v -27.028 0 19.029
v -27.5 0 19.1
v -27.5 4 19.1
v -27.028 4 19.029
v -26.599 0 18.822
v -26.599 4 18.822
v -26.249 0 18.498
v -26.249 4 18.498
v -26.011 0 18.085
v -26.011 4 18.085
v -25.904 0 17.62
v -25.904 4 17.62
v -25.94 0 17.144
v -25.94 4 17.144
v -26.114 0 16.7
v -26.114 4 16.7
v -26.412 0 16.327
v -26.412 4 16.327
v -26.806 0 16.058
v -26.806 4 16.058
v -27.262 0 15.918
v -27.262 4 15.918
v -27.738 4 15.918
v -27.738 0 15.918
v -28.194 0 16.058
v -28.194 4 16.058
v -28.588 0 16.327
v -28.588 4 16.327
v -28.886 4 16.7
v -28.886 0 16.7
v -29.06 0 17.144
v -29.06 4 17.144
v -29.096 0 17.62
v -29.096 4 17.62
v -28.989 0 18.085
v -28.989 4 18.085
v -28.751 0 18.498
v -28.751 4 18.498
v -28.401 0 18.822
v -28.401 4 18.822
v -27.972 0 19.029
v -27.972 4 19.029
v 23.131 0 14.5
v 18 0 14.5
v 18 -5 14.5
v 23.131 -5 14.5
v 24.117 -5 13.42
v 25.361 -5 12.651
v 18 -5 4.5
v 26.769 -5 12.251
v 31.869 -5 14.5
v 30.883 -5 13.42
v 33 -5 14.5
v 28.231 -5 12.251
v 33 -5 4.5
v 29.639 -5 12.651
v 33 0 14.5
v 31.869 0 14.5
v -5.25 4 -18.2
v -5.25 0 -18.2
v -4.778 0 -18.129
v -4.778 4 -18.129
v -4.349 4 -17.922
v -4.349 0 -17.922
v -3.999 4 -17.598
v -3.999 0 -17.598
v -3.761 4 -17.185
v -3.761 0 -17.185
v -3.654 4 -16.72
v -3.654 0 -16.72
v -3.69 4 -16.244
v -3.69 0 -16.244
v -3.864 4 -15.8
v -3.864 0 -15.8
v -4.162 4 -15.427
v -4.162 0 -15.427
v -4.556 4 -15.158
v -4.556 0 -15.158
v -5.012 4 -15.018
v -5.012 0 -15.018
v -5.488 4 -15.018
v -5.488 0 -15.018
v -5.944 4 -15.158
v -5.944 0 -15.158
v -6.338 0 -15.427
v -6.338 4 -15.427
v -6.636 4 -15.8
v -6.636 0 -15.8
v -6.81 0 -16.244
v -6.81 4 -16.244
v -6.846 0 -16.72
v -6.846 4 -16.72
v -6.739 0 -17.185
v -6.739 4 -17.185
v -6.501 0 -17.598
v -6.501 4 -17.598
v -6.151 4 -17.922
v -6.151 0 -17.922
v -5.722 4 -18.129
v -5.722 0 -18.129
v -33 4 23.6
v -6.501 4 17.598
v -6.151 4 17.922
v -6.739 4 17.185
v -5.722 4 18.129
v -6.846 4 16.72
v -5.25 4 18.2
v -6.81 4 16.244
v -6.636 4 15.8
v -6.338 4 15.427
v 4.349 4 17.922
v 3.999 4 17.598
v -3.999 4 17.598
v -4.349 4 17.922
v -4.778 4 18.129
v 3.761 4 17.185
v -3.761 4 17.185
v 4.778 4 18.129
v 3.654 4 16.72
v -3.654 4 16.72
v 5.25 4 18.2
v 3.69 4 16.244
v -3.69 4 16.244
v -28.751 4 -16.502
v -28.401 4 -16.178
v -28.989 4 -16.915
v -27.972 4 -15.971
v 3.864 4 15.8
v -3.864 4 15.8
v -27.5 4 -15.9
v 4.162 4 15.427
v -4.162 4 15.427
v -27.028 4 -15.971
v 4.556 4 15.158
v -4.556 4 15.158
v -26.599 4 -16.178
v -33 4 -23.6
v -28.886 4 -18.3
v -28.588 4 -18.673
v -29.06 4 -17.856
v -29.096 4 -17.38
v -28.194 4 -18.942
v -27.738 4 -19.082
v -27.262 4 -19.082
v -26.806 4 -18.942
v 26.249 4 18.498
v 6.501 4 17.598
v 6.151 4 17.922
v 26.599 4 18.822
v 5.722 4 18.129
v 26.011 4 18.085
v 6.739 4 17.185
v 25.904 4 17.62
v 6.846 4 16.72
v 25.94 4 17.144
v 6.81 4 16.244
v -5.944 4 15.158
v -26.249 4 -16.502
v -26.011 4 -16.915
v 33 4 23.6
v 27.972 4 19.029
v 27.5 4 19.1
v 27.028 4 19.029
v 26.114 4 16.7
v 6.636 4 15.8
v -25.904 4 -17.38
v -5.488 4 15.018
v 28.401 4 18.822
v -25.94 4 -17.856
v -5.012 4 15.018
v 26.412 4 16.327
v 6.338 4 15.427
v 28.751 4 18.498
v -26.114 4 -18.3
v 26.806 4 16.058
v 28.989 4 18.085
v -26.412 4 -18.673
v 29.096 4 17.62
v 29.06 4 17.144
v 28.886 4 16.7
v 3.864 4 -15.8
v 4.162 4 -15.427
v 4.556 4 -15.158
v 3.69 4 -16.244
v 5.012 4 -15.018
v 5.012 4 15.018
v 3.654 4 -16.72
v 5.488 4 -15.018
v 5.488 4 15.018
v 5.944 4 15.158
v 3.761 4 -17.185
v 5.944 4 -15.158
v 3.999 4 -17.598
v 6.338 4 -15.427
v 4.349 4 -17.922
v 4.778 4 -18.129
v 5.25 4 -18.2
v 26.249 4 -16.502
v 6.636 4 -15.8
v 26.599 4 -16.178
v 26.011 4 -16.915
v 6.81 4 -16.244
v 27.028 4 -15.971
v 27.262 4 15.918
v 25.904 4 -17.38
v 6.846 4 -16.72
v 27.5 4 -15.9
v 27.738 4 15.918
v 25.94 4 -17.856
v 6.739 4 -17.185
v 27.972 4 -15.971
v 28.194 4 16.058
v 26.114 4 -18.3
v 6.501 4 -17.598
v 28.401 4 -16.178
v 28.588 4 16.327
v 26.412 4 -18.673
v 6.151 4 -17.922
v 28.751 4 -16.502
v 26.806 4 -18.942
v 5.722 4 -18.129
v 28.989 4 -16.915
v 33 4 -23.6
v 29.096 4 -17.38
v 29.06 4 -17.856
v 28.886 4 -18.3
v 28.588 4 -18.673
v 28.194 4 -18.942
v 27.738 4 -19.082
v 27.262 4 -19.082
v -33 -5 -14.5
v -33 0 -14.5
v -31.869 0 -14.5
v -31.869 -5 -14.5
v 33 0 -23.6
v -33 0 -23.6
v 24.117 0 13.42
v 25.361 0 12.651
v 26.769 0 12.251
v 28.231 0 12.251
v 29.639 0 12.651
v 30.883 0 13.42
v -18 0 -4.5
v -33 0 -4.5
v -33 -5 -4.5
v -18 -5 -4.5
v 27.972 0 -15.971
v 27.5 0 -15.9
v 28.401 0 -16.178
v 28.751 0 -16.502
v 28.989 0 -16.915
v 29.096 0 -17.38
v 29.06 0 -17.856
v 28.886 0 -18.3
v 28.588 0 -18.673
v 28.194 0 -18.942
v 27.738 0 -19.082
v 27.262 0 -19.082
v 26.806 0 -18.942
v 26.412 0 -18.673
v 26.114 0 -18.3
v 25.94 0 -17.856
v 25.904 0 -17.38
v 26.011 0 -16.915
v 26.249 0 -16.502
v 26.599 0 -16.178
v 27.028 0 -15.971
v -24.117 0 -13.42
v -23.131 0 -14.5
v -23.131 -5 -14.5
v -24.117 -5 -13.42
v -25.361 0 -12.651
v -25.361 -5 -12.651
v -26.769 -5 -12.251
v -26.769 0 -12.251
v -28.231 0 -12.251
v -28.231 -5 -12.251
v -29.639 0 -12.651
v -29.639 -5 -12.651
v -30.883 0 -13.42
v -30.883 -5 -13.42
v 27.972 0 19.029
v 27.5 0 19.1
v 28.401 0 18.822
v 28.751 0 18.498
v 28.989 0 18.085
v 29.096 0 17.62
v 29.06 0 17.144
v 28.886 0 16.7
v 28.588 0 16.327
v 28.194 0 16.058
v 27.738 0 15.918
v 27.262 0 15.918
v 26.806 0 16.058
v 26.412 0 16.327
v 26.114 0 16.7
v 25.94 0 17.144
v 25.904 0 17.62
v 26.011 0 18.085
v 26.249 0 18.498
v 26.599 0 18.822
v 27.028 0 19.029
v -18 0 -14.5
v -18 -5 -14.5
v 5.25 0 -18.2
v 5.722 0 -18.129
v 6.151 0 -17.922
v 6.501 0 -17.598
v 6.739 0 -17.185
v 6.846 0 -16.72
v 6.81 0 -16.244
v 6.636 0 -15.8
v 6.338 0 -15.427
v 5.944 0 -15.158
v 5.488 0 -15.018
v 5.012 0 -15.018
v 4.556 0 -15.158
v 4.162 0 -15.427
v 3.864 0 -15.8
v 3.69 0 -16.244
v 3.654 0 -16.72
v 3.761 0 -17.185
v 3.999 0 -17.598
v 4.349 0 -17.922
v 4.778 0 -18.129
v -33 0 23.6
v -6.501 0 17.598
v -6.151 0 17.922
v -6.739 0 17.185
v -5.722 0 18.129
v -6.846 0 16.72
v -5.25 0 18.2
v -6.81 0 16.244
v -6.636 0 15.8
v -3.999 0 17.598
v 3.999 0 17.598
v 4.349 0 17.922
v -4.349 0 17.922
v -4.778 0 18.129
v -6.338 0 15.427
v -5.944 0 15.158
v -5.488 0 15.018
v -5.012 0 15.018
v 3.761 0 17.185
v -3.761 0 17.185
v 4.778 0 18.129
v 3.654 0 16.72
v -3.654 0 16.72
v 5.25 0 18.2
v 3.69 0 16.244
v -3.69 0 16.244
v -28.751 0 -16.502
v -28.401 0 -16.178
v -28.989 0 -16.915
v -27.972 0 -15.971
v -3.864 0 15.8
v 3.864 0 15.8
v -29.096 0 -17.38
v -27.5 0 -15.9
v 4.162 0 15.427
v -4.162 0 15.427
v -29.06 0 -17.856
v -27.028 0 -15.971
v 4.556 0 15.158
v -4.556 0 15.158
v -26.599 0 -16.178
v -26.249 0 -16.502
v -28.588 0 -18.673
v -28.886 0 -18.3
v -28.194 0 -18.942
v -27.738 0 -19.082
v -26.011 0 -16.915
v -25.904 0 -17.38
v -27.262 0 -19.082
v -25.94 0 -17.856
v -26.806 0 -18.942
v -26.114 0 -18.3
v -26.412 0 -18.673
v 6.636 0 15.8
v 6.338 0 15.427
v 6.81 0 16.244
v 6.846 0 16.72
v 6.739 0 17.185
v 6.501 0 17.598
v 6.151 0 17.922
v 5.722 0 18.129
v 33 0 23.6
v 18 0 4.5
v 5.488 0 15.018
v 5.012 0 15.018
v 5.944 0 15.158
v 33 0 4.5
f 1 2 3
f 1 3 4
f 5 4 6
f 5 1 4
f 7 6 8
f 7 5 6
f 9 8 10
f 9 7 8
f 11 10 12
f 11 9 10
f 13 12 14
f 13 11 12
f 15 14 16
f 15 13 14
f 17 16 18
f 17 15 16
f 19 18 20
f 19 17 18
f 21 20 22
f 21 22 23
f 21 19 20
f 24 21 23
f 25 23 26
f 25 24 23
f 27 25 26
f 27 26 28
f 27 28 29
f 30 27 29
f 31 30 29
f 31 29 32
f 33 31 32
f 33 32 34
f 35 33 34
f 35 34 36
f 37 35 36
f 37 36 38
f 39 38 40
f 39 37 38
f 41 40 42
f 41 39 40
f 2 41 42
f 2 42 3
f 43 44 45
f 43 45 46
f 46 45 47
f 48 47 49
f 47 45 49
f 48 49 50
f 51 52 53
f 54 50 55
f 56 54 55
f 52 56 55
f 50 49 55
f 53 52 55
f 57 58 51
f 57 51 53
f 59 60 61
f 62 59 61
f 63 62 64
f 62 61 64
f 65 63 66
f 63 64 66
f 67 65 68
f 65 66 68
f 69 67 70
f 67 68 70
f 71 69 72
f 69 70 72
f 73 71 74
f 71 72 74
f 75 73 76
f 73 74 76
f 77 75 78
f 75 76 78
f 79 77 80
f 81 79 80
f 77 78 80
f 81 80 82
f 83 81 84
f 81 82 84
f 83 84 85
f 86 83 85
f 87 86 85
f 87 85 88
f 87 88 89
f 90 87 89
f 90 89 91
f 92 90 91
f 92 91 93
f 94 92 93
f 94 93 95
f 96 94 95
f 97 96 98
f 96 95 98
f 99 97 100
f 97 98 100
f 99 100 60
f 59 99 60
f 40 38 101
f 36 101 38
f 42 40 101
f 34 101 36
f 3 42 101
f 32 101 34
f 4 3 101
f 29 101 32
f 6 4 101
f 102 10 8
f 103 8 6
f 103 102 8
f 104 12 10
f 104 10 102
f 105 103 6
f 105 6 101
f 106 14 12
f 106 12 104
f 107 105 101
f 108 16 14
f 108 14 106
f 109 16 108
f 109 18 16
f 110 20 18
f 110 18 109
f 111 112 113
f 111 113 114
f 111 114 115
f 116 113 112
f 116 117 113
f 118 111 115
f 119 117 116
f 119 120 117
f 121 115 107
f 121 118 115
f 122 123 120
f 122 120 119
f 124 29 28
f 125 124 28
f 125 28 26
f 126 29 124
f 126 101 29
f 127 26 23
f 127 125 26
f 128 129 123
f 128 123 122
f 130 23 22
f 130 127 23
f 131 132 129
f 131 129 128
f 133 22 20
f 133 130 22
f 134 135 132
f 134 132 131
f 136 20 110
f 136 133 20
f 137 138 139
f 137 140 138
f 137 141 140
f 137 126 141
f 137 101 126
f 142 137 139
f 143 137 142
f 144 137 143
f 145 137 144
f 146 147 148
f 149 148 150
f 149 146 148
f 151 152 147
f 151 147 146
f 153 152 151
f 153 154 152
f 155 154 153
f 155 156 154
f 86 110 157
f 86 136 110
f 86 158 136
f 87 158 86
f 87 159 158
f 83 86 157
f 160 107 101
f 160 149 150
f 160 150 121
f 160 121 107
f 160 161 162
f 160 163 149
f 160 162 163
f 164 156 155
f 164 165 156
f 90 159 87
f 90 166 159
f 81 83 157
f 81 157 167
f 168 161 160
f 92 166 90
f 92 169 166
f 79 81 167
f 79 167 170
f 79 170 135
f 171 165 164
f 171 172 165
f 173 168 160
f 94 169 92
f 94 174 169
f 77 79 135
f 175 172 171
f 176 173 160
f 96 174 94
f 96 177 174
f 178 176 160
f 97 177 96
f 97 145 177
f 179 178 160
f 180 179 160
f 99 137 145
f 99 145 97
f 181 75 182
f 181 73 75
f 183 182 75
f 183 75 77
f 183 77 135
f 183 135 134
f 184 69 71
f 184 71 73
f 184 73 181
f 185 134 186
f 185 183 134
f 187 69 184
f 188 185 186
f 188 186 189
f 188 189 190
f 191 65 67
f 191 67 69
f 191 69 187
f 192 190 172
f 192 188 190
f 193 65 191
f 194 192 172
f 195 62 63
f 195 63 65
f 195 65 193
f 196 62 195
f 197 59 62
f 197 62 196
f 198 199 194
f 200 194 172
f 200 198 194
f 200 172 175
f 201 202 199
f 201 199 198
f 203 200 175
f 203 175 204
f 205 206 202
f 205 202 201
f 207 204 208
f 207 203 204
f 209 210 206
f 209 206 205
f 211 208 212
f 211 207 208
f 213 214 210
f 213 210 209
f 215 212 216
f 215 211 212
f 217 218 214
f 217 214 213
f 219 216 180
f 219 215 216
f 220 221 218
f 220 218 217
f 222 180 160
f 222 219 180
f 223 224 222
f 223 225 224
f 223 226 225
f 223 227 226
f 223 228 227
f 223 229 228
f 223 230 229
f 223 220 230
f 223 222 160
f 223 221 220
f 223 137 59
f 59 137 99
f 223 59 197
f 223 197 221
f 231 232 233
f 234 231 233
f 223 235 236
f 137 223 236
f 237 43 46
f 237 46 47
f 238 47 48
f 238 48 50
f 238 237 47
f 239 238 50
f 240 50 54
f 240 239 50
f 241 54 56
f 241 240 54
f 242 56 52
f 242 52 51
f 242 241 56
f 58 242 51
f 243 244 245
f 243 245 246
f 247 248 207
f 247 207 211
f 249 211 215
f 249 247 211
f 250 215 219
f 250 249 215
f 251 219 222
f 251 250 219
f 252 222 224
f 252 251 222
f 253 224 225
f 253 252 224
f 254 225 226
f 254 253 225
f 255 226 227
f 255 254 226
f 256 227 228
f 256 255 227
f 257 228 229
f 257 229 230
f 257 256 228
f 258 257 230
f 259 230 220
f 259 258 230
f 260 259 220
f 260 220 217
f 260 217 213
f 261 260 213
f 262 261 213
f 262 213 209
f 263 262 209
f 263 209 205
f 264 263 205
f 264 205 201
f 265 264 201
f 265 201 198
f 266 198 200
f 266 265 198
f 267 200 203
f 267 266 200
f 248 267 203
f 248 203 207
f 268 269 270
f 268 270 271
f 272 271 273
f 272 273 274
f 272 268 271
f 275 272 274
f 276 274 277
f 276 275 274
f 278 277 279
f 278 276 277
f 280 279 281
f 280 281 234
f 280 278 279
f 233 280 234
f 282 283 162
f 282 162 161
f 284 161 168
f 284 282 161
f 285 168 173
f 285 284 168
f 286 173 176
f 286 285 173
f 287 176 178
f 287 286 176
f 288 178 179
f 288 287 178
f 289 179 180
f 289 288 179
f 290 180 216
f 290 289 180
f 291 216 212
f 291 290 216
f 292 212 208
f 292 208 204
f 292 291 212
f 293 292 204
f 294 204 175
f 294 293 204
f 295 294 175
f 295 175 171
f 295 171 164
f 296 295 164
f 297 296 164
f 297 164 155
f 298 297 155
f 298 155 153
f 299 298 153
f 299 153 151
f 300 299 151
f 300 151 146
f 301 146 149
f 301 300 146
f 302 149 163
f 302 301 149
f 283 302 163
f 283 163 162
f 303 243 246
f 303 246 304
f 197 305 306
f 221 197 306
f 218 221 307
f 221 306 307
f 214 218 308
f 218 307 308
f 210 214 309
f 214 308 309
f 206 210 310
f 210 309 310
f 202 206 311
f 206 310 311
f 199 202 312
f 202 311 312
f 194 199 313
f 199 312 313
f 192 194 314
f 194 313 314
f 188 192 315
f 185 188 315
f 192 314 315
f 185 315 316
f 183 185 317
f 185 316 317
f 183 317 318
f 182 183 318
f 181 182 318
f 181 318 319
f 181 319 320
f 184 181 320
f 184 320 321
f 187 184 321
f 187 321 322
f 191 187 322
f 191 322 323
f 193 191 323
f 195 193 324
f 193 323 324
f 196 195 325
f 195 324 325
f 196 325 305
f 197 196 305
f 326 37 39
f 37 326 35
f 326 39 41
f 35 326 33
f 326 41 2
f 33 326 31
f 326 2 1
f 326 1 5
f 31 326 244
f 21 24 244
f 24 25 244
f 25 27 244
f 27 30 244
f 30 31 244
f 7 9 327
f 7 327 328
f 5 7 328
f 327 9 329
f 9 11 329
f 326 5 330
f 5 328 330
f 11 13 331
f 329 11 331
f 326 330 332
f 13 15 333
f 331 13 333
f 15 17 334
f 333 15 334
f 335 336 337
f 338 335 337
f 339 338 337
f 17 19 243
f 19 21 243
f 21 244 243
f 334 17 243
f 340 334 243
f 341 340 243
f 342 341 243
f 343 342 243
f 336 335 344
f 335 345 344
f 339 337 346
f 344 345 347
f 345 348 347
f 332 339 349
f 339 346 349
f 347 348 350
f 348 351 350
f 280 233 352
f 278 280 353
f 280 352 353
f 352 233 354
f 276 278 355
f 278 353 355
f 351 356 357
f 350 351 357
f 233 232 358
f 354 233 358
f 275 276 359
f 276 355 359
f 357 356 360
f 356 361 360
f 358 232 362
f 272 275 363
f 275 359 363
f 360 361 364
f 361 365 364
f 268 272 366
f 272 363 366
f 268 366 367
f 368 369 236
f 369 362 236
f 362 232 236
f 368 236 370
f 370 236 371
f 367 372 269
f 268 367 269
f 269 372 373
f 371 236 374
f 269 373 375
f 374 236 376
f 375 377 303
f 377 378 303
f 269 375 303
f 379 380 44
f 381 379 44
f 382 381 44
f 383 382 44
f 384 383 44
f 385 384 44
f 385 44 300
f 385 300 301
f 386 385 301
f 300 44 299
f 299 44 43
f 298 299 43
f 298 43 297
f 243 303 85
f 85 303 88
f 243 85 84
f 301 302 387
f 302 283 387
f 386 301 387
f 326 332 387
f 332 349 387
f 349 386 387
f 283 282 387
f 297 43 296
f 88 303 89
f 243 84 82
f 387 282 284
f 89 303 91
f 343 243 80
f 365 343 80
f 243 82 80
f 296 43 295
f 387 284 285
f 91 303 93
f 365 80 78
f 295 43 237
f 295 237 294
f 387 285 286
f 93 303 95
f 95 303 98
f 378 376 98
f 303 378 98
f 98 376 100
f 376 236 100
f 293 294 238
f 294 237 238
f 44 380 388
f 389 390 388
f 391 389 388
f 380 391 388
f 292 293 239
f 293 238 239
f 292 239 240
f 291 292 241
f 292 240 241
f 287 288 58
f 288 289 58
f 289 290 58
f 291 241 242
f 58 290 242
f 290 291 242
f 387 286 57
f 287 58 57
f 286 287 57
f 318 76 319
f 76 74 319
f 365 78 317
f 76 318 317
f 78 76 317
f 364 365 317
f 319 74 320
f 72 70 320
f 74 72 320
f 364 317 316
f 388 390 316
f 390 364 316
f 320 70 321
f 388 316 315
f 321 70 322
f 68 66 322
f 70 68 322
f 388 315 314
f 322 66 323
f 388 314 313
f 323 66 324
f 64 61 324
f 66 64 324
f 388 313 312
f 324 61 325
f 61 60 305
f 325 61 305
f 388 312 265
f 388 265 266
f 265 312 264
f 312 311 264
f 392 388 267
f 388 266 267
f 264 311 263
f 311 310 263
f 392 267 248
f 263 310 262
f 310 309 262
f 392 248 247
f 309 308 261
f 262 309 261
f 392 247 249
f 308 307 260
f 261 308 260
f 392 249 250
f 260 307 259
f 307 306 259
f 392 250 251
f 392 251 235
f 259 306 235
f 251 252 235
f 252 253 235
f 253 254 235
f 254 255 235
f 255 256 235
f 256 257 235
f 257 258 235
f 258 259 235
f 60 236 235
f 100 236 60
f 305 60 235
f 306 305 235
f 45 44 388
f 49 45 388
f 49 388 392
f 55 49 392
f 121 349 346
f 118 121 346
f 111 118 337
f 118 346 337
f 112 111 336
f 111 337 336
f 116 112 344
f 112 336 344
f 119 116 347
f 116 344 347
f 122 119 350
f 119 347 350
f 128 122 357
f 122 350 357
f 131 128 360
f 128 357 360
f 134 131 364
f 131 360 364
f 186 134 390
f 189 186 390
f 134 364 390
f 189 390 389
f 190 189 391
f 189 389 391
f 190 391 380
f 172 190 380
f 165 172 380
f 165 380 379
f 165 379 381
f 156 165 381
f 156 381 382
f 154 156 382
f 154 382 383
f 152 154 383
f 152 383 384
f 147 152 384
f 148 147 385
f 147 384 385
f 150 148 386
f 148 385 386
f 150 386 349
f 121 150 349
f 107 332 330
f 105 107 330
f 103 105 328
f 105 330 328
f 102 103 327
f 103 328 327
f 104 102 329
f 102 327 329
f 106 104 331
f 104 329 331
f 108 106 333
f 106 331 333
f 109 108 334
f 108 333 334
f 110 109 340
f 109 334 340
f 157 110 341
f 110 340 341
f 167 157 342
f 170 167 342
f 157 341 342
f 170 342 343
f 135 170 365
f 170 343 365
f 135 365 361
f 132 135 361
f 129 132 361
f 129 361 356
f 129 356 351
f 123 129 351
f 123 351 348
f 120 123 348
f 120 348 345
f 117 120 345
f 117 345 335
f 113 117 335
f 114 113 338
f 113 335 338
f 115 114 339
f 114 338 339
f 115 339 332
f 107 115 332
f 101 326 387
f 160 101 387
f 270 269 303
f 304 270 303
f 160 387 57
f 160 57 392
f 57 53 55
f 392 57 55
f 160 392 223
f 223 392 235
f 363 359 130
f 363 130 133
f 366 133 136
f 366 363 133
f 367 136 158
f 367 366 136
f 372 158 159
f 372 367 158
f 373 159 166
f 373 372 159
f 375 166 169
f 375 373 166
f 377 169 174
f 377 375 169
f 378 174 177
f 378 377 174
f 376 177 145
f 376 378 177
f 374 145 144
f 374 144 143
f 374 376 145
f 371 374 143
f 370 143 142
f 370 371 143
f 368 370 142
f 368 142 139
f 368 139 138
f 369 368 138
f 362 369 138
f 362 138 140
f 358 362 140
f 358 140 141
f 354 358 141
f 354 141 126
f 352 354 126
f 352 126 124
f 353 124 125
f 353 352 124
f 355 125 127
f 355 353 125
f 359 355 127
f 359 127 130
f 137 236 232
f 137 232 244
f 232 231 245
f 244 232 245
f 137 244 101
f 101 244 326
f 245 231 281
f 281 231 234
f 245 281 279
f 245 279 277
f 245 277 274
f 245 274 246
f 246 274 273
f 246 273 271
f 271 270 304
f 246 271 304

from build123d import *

# Parameters (mm, degrees)
SKETCH_7_R          = 1.6
SKETCH_7_W          = 15
SKETCH_7_H          = 10
EXTRUDE_1_DEPTH     = 4
SKETCH_8_R          = 1.6
CUT_EXTRUDE_1_DEPTH = 4
SKETCH_7_3_W        = 15
SKETCH_7_3_H        = 10
EXTRUDE_2_DEPTH     = 5
CUT_EXTRUDE_2_DEPTH = 5


with BuildPart() as part:
    # 草图7 → 凸台-拉伸1 (new body)
    # profile 1 of 3: a face of its own
    with BuildSketch(Plane(origin=(0, 0, 0), x_dir=(1, 0, 0), z_dir=(0, 1, 0))):
        Polygon((33, 23.6), (-33, 23.6), (-33, 14.5), (-18, 14.5), (-18, 4.5), (-33, 4.5), (-33, -23.6), (33, -23.6), (33, -14.5), (18, -14.5), (18, -4.5), (33, -4.5), align=None)
        with Locations(Location((-27.5, -17.5, 0), (0, 0, 270))):
            Circle(SKETCH_7_R, mode=Mode.SUBTRACT)
        with Locations(Location((27.5, -17.5, 0), (0, 0, 270))):
            Circle(SKETCH_7_R, mode=Mode.SUBTRACT)
        with Locations(Location((-27.5, 17.5, 0), (0, 0, 270))):
            Circle(SKETCH_7_R, mode=Mode.SUBTRACT)
        with Locations(Location((27.5, 17.5, 0), (0, 0, 270))):
            Circle(SKETCH_7_R, mode=Mode.SUBTRACT)
    # profile 2 of 3: a face of its own
    with BuildSketch(Plane(origin=(0, 0, 0), x_dir=(1, 0, 0), z_dir=(0, 1, 0))):
        with Locations((-25.5, 9.5)):
            Rectangle(SKETCH_7_W, SKETCH_7_H)
    # profile 3 of 3: a face of its own
    with BuildSketch(Plane(origin=(0, 0, 0), x_dir=(1, 0, 0), z_dir=(0, 1, 0))):
        with Locations((25.5, -9.5)):
            Rectangle(SKETCH_7_W, SKETCH_7_H)
    extrude(amount=EXTRUDE_1_DEPTH)

    # 草图8 → 切除-拉伸1 (cut)
    with BuildSketch(Plane.XZ):
        with Locations(Location((-5.25, -16.6, 0), (0, 0, 270))):
            Circle(SKETCH_8_R)
        with Locations(Location((5.25, -16.6, 0), (0, 0, 270))):
            Circle(SKETCH_8_R)
        with Locations(Location((-5.25, 16.6, 0), (0, 0, 90))):
            Circle(SKETCH_8_R)
        with Locations(Location((5.25, 16.6, 0), (0, 0, 90))):
            Circle(SKETCH_8_R)
    extrude(amount=-CUT_EXTRUDE_1_DEPTH, mode=Mode.SUBTRACT)

    # 草图7<3> → 凸台-拉伸2 (add)
    with BuildSketch(Plane(origin=(0, 0, 0), x_dir=(1, 0, 0), z_dir=(0, 1, 0))):
        with Locations((-25.5, 9.5)):
            Rectangle(SKETCH_7_3_W, SKETCH_7_3_H)
        with Locations((25.5, -9.5)):
            Rectangle(SKETCH_7_3_W, SKETCH_7_3_H)
    extrude(amount=-EXTRUDE_2_DEPTH)

    # 草图10 → 切除-拉伸2 (cut)
    with BuildSketch(Plane.XZ):
        with BuildLine():
            ThreePointArc((-23.130789545, -14.5), (-27.5, -12.2), (-31.869210455, -14.5))
            Line((-31.869210455, -14.5), (-23.130789545, -14.5))
        make_face()
        with BuildLine():
            ThreePointArc((23.130789545, 14.5), (27.5, 12.2), (31.869210455, 14.5))
            Line((31.869210455, 14.5), (23.130789545, 14.5))
        make_face()
    extrude(amount=CUT_EXTRUDE_2_DEPTH, mode=Mode.SUBTRACT)


solid = part.part
